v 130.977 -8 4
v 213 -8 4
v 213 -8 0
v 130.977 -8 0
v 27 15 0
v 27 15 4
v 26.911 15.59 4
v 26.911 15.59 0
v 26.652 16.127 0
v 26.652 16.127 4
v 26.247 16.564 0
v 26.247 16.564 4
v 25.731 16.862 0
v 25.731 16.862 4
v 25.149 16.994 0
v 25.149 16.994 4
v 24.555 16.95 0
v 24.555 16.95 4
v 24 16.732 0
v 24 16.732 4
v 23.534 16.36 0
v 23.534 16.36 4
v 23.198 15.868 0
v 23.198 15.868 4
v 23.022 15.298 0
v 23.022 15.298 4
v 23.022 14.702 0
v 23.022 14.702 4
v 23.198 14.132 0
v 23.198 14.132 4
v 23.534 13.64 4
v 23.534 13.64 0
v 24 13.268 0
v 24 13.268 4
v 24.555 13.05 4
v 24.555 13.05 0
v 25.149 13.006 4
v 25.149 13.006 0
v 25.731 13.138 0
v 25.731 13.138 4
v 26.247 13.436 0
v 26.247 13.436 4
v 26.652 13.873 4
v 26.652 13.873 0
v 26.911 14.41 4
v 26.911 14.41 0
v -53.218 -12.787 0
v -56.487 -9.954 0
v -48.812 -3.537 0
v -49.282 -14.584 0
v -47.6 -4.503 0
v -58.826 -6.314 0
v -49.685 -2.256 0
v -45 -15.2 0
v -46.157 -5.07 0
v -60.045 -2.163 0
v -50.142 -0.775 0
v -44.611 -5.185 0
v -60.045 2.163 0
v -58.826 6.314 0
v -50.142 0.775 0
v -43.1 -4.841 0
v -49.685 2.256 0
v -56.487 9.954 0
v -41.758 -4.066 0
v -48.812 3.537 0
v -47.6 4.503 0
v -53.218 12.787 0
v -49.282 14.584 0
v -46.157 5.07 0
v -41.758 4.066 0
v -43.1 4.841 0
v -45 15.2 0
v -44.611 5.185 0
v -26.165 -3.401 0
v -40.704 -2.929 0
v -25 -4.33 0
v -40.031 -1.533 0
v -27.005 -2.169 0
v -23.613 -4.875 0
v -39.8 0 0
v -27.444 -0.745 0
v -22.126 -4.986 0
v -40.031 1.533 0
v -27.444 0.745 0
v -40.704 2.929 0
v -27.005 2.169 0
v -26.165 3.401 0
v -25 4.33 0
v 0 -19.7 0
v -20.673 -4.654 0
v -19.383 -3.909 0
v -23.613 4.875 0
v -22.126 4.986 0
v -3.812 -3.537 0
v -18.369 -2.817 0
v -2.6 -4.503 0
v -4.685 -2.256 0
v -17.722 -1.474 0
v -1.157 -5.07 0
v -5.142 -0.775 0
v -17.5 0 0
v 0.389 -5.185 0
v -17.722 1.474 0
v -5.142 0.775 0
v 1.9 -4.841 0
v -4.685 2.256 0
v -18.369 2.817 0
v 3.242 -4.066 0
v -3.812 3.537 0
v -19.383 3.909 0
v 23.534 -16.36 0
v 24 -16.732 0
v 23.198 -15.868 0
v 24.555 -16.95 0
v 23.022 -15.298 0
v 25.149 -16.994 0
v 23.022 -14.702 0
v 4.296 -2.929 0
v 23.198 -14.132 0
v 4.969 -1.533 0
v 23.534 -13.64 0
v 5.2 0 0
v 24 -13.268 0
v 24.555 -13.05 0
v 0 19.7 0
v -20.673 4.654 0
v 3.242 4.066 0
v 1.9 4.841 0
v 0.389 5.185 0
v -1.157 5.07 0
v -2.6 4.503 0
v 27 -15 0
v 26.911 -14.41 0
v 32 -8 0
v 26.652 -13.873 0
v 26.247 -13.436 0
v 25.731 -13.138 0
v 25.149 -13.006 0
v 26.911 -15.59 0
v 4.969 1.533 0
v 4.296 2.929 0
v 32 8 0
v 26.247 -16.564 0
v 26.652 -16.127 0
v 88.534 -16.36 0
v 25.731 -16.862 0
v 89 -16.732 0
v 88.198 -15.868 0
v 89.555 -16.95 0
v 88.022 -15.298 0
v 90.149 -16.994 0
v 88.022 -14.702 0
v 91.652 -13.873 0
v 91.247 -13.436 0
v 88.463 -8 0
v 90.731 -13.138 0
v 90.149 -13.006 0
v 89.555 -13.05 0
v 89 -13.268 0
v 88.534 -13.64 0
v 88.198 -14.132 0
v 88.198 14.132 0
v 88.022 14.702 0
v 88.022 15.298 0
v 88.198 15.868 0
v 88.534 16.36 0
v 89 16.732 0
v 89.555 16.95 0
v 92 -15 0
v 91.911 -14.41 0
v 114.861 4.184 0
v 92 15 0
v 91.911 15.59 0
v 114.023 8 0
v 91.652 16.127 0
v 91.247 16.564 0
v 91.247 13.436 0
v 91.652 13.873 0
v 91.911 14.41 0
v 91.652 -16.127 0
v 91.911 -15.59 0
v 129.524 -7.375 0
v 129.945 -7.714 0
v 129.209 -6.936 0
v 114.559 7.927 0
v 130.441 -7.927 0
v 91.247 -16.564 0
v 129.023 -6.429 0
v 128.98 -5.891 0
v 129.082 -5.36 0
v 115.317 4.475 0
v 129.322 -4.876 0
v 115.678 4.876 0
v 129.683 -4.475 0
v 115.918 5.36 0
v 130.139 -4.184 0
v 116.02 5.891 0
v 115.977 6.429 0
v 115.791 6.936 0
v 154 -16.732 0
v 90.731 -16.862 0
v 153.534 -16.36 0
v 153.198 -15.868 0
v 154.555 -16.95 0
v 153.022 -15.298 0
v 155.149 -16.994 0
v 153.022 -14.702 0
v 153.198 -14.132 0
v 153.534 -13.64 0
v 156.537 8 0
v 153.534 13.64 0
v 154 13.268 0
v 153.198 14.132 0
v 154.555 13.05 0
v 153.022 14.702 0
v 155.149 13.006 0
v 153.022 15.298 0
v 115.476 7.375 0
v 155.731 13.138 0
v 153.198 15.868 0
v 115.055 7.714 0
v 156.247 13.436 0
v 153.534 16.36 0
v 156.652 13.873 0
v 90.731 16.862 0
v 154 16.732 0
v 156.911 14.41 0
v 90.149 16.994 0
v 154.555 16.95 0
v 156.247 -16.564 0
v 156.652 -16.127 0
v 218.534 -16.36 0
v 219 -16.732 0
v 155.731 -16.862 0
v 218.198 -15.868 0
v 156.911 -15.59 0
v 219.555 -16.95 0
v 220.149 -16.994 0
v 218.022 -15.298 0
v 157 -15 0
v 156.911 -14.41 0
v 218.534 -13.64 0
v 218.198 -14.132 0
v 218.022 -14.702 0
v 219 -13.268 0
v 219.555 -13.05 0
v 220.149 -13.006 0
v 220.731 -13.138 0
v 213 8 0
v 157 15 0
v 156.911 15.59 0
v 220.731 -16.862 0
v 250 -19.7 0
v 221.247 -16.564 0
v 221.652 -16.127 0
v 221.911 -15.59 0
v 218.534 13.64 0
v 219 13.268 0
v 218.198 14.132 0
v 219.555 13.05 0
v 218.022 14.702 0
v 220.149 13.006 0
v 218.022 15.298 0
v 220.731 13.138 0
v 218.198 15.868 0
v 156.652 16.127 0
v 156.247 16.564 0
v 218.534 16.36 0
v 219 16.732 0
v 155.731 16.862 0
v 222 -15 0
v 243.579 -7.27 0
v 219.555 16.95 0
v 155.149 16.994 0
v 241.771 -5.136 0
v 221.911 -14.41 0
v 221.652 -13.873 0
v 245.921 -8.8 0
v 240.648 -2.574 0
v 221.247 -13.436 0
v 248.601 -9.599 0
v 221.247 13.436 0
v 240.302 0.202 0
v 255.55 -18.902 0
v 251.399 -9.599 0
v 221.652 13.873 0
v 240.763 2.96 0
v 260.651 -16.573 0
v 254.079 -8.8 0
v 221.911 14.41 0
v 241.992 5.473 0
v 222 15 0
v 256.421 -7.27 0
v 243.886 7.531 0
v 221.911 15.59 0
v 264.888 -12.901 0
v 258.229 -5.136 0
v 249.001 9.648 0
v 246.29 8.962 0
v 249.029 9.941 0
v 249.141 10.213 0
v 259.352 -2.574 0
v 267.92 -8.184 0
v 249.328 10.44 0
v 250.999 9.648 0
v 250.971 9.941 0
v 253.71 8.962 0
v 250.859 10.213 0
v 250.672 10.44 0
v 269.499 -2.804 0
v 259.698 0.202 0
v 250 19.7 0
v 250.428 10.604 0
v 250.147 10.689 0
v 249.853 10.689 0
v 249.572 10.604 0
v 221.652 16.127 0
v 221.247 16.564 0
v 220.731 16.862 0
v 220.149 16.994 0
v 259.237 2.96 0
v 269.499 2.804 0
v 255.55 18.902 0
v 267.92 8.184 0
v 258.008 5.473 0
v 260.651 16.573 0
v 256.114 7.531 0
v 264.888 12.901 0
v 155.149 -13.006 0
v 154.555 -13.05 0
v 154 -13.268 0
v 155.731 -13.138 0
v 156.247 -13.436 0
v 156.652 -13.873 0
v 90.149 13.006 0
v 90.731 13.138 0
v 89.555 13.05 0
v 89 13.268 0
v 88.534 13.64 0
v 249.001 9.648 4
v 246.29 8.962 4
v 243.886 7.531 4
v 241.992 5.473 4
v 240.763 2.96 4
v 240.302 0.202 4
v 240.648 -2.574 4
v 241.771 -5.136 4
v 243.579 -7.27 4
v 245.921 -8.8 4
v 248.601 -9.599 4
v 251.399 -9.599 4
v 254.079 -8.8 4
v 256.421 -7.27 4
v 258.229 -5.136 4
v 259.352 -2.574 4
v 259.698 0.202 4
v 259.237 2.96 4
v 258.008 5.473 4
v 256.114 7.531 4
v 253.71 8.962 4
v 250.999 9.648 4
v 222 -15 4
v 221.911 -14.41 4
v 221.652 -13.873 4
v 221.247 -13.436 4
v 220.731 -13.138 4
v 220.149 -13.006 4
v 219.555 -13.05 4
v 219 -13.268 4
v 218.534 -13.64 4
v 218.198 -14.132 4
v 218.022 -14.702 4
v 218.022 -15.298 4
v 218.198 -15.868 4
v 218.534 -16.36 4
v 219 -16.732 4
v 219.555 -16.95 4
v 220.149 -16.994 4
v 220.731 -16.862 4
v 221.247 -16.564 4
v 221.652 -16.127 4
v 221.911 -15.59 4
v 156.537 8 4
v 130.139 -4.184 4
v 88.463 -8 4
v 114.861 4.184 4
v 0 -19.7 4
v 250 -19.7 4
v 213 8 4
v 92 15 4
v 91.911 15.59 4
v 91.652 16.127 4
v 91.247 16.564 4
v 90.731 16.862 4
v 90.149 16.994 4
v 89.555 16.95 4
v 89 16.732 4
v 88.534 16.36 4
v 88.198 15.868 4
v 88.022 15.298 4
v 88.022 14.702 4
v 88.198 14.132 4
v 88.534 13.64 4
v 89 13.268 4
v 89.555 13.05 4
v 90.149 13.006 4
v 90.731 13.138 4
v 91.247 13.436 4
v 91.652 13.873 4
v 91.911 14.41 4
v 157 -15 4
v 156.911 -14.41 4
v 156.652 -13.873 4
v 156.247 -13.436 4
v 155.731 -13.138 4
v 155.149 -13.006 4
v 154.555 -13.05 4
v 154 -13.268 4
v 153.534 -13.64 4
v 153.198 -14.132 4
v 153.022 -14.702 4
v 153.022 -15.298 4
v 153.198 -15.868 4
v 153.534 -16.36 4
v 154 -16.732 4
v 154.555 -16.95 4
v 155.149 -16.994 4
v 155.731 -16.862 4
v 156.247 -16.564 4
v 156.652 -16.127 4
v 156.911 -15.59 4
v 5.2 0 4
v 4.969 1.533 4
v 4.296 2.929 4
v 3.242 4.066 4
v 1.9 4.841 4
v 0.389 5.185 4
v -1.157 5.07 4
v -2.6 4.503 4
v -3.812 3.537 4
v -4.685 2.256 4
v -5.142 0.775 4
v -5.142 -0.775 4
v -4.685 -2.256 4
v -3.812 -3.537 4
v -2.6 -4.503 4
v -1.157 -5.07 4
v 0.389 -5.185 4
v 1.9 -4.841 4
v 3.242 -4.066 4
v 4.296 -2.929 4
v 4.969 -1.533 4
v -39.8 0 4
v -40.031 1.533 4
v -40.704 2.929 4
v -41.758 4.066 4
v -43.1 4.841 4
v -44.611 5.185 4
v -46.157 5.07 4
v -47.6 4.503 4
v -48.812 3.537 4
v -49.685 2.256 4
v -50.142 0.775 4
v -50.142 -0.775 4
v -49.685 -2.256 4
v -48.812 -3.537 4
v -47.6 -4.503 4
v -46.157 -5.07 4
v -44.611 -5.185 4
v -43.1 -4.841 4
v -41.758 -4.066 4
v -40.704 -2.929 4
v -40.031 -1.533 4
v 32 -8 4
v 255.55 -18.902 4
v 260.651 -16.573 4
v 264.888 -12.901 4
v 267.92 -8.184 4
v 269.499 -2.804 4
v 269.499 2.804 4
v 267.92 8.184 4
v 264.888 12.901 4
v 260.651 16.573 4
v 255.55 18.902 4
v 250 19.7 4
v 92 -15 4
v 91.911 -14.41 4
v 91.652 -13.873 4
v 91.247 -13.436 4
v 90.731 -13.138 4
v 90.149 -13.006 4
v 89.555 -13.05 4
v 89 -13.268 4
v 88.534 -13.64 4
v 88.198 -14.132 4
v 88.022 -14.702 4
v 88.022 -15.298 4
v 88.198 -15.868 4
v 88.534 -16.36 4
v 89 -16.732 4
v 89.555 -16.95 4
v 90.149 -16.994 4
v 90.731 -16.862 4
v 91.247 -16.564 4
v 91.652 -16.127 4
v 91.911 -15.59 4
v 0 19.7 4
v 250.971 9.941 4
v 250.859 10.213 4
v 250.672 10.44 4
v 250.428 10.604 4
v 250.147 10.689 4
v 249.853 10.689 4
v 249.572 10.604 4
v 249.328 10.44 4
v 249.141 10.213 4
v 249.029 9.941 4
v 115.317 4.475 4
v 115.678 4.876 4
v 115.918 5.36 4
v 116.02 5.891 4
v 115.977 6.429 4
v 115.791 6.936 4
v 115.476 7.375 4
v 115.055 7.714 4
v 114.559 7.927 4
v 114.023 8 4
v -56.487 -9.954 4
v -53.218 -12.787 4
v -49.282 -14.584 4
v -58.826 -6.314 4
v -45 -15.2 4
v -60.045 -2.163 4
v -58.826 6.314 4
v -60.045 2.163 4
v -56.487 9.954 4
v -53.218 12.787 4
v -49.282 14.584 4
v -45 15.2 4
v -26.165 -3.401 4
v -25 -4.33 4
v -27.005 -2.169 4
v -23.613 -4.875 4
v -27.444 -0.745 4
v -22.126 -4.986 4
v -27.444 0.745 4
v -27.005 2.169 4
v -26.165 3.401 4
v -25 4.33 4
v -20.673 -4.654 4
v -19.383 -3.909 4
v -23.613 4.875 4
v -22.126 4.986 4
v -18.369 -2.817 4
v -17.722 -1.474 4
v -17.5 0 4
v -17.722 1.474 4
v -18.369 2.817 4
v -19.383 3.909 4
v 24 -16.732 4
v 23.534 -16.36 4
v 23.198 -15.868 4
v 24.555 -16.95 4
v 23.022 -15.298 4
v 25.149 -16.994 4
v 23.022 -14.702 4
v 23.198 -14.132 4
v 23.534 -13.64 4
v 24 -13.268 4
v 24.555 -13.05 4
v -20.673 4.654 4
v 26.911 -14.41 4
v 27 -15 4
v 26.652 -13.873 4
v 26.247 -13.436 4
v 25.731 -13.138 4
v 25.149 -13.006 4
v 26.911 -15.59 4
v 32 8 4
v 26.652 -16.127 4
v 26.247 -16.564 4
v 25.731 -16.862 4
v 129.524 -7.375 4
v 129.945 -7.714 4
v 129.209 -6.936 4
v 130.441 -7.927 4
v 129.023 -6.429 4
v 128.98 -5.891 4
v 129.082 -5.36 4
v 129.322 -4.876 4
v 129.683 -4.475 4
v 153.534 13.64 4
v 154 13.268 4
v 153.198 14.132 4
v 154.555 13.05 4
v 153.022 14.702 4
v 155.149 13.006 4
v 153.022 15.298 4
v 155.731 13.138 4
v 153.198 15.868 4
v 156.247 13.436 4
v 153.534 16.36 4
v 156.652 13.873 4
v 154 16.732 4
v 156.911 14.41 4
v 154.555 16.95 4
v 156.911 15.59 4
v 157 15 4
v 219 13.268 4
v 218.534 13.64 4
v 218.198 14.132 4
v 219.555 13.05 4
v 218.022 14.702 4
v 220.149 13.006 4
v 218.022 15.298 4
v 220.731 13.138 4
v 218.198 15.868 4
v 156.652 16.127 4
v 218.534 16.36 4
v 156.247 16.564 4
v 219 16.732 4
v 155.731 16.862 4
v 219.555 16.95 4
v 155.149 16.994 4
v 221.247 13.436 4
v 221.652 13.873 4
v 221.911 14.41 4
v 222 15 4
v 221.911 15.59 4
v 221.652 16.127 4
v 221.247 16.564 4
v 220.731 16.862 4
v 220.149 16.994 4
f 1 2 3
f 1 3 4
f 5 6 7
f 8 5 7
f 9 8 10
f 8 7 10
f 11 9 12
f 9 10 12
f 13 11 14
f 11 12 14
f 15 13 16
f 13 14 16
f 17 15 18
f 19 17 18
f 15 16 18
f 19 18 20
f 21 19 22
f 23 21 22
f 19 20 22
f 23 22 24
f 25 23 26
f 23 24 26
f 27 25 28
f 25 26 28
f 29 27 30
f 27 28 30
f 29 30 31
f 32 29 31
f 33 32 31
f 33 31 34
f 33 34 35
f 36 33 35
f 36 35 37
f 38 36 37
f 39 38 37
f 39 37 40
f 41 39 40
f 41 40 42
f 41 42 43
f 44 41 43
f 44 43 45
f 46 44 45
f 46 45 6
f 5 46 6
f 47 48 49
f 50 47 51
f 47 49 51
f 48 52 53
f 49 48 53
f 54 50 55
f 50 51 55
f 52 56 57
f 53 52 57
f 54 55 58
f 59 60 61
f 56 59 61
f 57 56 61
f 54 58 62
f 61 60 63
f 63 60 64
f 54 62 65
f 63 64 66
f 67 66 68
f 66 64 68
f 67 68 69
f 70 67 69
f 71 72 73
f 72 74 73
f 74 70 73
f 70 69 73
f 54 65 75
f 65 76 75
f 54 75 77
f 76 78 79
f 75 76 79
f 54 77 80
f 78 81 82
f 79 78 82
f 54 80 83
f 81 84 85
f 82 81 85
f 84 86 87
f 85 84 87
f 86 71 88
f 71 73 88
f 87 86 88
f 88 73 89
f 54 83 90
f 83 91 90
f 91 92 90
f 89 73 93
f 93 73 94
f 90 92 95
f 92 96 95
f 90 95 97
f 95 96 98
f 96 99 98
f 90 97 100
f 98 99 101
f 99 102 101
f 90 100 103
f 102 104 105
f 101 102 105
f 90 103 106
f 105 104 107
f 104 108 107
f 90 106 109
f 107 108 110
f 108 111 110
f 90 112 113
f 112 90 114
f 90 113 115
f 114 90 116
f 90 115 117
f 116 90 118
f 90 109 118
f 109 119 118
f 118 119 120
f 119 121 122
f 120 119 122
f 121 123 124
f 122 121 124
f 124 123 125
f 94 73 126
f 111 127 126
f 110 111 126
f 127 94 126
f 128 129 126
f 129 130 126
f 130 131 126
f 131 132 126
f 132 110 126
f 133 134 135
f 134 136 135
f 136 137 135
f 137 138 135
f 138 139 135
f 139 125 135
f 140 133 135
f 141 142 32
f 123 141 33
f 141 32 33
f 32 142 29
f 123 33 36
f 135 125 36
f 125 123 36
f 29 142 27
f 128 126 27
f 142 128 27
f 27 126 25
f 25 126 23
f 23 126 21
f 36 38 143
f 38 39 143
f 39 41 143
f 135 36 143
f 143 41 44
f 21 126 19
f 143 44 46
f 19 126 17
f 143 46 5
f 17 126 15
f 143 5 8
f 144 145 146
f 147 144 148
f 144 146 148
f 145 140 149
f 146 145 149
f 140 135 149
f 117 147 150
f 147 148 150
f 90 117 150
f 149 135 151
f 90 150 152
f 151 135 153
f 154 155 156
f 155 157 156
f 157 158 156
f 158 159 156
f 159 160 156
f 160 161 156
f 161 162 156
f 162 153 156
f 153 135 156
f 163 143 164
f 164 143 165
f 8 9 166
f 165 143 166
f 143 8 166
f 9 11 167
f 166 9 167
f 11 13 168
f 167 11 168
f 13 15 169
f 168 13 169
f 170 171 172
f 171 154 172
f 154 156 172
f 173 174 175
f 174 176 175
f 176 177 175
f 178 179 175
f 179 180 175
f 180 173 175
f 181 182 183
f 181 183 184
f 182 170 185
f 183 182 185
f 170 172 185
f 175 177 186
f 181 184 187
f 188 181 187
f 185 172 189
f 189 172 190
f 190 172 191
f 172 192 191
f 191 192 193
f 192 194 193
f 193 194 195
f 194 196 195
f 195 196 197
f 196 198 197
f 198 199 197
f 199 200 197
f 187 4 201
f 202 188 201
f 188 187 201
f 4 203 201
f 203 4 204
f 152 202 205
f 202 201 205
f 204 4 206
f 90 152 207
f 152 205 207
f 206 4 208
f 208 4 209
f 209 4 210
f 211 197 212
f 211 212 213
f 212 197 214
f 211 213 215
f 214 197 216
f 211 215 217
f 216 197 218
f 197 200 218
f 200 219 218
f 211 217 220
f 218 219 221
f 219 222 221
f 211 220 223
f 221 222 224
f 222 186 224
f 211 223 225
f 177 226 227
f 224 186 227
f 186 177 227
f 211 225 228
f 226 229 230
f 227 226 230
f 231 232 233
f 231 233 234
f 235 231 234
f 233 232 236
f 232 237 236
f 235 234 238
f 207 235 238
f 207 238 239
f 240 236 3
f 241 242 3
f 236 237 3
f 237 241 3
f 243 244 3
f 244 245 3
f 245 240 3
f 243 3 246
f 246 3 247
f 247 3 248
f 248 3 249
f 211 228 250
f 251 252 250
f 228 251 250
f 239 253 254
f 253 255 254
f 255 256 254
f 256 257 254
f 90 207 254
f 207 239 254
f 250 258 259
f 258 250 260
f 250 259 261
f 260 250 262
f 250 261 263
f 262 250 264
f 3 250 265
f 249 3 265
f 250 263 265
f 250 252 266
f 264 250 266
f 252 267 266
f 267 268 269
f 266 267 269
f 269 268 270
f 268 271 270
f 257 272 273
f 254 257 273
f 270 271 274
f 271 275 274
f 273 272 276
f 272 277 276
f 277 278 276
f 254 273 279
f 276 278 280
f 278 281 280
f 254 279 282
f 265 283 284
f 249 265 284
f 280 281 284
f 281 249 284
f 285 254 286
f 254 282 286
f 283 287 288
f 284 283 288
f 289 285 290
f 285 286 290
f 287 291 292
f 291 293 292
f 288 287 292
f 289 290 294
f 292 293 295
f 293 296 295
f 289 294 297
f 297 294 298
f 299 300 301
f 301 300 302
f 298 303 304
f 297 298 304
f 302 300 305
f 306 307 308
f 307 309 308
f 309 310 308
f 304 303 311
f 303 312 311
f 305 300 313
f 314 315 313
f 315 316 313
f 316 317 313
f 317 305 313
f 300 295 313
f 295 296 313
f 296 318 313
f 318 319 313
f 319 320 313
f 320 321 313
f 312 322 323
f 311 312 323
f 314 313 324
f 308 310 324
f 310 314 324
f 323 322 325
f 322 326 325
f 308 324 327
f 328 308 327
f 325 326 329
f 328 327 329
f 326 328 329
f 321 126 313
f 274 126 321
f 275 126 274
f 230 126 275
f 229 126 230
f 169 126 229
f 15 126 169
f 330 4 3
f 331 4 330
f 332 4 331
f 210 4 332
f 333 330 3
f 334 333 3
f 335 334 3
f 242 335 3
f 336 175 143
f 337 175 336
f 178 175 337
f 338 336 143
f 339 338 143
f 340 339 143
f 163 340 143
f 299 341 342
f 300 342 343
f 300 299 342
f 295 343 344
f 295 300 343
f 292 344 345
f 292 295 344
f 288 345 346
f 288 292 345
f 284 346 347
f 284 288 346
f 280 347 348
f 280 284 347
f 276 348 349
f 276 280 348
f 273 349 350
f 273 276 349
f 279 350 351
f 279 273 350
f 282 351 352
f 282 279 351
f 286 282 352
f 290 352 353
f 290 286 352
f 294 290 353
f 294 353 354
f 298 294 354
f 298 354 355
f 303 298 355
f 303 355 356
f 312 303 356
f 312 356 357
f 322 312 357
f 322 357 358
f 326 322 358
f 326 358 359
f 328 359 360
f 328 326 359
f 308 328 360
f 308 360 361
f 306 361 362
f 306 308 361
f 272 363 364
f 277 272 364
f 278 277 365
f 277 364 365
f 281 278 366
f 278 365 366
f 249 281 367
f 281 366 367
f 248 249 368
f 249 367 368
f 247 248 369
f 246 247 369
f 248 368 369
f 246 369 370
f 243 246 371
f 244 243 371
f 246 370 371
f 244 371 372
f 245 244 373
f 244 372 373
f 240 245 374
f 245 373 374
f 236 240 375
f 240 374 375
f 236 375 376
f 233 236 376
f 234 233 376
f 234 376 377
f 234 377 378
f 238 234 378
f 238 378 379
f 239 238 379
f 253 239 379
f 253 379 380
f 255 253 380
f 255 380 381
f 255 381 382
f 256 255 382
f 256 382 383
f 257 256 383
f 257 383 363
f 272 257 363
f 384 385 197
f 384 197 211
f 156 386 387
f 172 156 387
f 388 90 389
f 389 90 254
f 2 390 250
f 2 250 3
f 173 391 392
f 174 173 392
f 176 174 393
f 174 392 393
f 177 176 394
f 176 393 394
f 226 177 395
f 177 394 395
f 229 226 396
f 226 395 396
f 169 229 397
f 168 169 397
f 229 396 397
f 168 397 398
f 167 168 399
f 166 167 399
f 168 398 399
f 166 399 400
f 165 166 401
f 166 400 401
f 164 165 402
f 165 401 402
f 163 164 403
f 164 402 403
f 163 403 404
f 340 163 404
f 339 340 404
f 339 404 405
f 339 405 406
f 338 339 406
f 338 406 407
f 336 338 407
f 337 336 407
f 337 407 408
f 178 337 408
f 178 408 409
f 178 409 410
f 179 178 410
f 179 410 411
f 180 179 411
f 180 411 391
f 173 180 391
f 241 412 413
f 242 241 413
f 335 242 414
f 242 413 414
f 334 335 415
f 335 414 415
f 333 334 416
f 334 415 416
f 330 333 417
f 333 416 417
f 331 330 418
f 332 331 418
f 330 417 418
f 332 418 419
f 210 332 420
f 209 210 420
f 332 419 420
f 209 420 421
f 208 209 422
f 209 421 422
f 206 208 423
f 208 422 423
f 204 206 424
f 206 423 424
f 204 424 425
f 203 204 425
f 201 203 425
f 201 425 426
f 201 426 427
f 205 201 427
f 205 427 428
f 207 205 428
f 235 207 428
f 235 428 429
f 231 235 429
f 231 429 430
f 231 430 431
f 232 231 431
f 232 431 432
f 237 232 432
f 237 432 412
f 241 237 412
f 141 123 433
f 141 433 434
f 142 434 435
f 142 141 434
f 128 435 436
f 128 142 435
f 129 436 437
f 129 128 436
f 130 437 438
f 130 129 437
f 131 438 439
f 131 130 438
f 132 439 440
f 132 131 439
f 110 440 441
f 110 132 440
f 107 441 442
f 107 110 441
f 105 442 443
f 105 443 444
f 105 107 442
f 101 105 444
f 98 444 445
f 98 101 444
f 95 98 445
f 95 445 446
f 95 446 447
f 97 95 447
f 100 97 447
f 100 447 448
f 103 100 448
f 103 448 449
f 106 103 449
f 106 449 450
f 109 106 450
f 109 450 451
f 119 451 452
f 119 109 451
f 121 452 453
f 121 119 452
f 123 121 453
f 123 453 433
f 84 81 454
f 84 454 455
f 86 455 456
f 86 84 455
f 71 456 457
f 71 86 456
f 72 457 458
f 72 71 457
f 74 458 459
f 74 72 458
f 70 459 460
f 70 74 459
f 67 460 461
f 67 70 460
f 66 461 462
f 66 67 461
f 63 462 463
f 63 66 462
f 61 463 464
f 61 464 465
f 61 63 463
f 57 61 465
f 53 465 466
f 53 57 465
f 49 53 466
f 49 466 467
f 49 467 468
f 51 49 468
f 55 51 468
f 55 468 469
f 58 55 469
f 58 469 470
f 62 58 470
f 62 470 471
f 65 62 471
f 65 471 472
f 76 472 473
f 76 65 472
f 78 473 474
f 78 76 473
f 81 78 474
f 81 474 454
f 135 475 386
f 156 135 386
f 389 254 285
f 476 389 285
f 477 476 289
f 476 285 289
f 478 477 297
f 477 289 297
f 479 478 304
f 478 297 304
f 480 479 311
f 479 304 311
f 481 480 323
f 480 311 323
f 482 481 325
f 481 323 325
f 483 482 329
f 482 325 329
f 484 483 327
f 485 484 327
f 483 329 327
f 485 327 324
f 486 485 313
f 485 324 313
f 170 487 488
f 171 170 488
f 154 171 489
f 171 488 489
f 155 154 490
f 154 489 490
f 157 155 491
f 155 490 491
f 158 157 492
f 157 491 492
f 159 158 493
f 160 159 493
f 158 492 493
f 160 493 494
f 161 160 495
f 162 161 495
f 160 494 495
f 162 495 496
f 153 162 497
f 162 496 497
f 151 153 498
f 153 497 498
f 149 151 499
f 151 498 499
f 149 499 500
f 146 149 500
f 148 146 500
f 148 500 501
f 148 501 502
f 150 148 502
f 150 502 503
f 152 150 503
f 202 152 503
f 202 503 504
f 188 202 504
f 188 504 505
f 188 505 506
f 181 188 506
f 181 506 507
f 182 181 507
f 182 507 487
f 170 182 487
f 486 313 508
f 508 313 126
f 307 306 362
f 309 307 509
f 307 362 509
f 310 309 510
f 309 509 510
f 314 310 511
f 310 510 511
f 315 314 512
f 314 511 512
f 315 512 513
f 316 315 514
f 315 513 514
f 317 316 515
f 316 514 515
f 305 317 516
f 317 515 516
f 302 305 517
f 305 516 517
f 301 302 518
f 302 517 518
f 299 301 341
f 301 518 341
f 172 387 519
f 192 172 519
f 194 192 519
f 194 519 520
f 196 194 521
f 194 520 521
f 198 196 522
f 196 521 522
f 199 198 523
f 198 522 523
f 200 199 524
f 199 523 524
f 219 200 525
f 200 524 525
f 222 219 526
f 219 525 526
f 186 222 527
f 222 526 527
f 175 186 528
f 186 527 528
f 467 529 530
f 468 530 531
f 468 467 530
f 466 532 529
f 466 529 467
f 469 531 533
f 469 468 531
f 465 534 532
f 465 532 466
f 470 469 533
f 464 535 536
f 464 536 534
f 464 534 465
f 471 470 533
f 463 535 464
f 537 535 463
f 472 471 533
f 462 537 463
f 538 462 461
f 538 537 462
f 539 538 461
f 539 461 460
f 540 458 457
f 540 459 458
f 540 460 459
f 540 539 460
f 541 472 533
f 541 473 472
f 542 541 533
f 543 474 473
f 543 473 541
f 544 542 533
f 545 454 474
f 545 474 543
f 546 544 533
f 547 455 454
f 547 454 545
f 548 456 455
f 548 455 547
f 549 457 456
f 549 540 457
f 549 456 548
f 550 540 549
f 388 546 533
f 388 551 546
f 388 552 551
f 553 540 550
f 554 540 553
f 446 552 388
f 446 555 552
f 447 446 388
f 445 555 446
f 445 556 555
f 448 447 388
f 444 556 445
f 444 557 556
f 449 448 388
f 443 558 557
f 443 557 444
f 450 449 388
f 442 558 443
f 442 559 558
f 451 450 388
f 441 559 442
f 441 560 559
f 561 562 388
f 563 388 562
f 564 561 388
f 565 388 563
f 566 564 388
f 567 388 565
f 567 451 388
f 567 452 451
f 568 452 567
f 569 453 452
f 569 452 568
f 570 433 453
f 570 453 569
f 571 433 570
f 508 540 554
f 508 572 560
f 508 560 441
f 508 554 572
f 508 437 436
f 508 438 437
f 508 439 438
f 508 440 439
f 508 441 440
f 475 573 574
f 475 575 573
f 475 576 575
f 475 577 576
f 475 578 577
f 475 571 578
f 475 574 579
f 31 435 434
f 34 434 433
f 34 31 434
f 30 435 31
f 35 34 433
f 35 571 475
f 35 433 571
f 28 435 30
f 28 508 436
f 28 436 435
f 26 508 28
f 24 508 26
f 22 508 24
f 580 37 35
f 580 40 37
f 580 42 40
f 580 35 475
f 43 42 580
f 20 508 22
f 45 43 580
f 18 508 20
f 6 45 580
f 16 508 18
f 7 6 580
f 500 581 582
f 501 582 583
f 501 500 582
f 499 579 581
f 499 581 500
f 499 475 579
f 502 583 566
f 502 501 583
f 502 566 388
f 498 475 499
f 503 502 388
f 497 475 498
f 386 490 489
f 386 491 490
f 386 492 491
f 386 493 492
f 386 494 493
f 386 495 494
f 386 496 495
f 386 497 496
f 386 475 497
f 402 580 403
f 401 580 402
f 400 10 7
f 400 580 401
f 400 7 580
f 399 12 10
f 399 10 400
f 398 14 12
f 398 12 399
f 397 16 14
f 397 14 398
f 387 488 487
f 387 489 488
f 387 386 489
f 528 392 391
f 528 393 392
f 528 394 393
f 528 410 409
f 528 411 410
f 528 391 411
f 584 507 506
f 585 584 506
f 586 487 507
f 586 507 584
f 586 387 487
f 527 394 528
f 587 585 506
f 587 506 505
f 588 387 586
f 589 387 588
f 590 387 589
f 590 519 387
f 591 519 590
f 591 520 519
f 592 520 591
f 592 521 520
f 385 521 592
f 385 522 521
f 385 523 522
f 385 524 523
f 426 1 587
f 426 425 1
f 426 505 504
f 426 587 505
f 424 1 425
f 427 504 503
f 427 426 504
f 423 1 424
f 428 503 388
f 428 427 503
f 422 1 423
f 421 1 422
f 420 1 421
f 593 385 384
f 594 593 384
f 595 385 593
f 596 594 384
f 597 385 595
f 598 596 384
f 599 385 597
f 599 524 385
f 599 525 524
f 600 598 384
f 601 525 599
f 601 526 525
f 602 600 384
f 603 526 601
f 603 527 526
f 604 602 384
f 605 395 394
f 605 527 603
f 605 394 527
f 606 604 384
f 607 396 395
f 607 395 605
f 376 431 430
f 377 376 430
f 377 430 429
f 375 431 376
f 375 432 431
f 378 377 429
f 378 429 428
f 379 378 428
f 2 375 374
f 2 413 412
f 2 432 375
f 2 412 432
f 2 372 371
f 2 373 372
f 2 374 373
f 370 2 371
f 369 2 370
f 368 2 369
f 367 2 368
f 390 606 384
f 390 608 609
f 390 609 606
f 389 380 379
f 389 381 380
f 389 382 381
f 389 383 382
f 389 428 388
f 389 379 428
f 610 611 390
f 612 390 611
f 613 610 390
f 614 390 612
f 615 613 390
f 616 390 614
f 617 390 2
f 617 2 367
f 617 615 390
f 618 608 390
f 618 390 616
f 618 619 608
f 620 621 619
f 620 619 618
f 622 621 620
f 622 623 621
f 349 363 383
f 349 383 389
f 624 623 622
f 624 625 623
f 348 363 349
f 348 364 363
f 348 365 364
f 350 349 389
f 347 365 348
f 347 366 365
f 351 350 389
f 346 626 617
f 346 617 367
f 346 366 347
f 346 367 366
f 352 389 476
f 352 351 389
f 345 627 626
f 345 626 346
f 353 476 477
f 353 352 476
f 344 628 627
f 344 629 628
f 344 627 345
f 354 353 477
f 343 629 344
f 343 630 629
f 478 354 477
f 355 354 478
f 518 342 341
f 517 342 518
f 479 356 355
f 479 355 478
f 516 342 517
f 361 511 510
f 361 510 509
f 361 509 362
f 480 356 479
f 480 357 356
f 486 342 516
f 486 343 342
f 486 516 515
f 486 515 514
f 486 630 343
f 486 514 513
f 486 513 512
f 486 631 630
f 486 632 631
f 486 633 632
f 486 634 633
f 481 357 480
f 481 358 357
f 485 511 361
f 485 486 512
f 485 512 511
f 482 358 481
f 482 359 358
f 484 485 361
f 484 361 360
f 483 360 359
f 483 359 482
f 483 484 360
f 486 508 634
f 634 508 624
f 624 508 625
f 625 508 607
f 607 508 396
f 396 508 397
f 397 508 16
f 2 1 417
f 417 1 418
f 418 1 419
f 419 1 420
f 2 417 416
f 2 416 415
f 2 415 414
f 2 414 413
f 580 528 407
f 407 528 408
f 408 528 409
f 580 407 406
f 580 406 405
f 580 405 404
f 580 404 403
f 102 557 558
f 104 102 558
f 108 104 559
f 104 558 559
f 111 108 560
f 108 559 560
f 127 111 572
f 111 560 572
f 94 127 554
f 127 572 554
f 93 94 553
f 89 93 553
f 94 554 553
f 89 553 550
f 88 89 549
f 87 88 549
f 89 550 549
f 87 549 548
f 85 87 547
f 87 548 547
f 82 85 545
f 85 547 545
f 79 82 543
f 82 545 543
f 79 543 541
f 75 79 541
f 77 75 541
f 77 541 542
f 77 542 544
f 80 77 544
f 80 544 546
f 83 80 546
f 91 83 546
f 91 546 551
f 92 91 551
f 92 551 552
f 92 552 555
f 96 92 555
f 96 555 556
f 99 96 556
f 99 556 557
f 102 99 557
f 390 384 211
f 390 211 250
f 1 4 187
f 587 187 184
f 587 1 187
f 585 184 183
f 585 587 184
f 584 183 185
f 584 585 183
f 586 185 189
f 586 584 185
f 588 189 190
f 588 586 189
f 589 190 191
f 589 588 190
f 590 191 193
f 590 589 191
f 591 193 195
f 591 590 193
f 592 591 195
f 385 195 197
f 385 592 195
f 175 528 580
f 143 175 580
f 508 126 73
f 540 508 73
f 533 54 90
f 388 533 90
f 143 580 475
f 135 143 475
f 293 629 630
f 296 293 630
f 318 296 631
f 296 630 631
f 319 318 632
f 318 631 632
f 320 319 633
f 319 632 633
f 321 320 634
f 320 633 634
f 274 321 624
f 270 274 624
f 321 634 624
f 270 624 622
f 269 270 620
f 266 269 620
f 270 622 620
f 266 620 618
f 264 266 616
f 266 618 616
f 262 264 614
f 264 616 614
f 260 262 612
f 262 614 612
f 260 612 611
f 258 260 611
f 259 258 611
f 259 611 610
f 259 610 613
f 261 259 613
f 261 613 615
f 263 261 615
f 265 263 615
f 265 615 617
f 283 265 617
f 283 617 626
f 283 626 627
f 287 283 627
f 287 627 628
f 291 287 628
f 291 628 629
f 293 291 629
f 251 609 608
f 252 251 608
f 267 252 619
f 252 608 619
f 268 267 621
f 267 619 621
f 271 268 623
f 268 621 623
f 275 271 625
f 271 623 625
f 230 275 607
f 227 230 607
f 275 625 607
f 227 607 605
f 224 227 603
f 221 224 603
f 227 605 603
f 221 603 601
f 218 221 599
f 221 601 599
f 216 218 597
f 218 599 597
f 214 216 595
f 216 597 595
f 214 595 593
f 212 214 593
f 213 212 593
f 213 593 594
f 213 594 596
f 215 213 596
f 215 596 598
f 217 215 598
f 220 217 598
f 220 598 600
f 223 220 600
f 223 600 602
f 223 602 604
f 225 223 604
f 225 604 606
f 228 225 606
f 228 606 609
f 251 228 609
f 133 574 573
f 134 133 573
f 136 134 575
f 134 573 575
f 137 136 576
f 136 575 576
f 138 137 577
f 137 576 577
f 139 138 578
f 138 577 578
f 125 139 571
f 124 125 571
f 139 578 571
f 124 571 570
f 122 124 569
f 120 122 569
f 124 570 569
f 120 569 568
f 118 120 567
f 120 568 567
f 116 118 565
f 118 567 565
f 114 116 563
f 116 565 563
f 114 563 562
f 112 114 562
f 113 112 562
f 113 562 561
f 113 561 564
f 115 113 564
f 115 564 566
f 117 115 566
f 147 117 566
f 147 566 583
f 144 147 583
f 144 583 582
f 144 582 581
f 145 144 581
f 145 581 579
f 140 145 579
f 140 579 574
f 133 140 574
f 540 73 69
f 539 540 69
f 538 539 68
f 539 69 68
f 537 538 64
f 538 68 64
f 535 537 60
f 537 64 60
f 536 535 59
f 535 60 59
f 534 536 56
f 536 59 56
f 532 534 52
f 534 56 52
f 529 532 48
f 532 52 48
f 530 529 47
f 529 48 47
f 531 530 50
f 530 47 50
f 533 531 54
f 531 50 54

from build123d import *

# Parameters (mm, degrees)
SKETCH_1_R          = 5.2
SKETCH_1_R_2        = 9.7
EXTRUDE_1_DEPTH     = 4
SKETCH_2_R          = 2
CUT_EXTRUDE_1_DEPTH = 10
SKETCH_3_R          = 5
CUT_EXTRUDE_2_DEPTH = 10
SKETCH_4_R          = 1
CUT_EXTRUDE_3_DEPTH = 10


with BuildPart() as part:
    # 草图1 → 凸台-拉伸1 (new body)
    with BuildSketch(Plane.XY):
        with BuildLine():
            Line((250, 19.7), (0, 19.7))
            Line((0, 19.7), (-45, 15.2))
            ThreePointArc((-45, 15.2), (-60.2, 0), (-45, -15.2))
            Line((-45, -15.2), (0, -19.7))
            Line((0, -19.7), (250, -19.7))
            ThreePointArc((250, -19.7), (269.7, 0), (250, 19.7))
        make_face()
        Circle(SKETCH_1_R, mode=Mode.SUBTRACT)
        with Locations((250, 0)):
            Circle(SKETCH_1_R_2, mode=Mode.SUBTRACT)
        with Locations((-45, 0)):
            Circle(SKETCH_1_R, mode=Mode.SUBTRACT)
    extrude(amount=EXTRUDE_1_DEPTH)

    # 草图2 → 切除-拉伸1 (cut)
    with BuildSketch(Plane.XY.offset(4)):
        with Locations((25, 15)):
            Circle(SKETCH_2_R)
        with Locations((90, 15)):
            Circle(SKETCH_2_R)
        with Locations((155, 15)):
            Circle(SKETCH_2_R)
        with Locations((220, 15)):
            Circle(SKETCH_2_R)
        with Locations((90, -15)):
            Circle(SKETCH_2_R)
        with Locations((155, -15)):
            Circle(SKETCH_2_R)
        with Locations((220, -15)):
            Circle(SKETCH_2_R)
        with Locations((25, -15)):
            Circle(SKETCH_2_R)
    extrude(amount=-CUT_EXTRUDE_1_DEPTH, mode=Mode.SUBTRACT)

    # 草图3 → 切除-拉伸2 (cut)
    with BuildSketch(Plane.XY.offset(4)):
        with Locations((-22.5, 0)):
            Circle(SKETCH_3_R)
        with BuildLine():
            Line((32, 8), (32, -8))
            Line((32, -8), (88.462542093, -8))
            Line((88.462542093, -8), (114.86138476, 4.184081231))
            ThreePointArc((114.86138476, 4.184081231), (115.976706085, 6.429046887), (114.023268405, 8))
            Line((114.023268405, 8), (32, 8))
        make_face()
        with BuildLine():
            Line((156.537457907, 8), (213, 8))
            Line((213, 8), (213, -8))
            Line((213, -8), (130.976731595, -8))
            ThreePointArc((130.976731595, -8), (129.023293915, -6.429046887), (130.13861524, -4.184081231))
            Line((130.13861524, -4.184081231), (156.537457907, 8))
        make_face()
    extrude(amount=-CUT_EXTRUDE_2_DEPTH, mode=Mode.SUBTRACT)

    # 草图4 → 切除-拉伸3 (cut)
    with BuildSketch(Plane.XY.offset(4)):
        with Locations((250, 9.7)):
            Circle(SKETCH_4_R)
    extrude(amount=-CUT_EXTRUDE_3_DEPTH, mode=Mode.SUBTRACT)


solid = part.part
